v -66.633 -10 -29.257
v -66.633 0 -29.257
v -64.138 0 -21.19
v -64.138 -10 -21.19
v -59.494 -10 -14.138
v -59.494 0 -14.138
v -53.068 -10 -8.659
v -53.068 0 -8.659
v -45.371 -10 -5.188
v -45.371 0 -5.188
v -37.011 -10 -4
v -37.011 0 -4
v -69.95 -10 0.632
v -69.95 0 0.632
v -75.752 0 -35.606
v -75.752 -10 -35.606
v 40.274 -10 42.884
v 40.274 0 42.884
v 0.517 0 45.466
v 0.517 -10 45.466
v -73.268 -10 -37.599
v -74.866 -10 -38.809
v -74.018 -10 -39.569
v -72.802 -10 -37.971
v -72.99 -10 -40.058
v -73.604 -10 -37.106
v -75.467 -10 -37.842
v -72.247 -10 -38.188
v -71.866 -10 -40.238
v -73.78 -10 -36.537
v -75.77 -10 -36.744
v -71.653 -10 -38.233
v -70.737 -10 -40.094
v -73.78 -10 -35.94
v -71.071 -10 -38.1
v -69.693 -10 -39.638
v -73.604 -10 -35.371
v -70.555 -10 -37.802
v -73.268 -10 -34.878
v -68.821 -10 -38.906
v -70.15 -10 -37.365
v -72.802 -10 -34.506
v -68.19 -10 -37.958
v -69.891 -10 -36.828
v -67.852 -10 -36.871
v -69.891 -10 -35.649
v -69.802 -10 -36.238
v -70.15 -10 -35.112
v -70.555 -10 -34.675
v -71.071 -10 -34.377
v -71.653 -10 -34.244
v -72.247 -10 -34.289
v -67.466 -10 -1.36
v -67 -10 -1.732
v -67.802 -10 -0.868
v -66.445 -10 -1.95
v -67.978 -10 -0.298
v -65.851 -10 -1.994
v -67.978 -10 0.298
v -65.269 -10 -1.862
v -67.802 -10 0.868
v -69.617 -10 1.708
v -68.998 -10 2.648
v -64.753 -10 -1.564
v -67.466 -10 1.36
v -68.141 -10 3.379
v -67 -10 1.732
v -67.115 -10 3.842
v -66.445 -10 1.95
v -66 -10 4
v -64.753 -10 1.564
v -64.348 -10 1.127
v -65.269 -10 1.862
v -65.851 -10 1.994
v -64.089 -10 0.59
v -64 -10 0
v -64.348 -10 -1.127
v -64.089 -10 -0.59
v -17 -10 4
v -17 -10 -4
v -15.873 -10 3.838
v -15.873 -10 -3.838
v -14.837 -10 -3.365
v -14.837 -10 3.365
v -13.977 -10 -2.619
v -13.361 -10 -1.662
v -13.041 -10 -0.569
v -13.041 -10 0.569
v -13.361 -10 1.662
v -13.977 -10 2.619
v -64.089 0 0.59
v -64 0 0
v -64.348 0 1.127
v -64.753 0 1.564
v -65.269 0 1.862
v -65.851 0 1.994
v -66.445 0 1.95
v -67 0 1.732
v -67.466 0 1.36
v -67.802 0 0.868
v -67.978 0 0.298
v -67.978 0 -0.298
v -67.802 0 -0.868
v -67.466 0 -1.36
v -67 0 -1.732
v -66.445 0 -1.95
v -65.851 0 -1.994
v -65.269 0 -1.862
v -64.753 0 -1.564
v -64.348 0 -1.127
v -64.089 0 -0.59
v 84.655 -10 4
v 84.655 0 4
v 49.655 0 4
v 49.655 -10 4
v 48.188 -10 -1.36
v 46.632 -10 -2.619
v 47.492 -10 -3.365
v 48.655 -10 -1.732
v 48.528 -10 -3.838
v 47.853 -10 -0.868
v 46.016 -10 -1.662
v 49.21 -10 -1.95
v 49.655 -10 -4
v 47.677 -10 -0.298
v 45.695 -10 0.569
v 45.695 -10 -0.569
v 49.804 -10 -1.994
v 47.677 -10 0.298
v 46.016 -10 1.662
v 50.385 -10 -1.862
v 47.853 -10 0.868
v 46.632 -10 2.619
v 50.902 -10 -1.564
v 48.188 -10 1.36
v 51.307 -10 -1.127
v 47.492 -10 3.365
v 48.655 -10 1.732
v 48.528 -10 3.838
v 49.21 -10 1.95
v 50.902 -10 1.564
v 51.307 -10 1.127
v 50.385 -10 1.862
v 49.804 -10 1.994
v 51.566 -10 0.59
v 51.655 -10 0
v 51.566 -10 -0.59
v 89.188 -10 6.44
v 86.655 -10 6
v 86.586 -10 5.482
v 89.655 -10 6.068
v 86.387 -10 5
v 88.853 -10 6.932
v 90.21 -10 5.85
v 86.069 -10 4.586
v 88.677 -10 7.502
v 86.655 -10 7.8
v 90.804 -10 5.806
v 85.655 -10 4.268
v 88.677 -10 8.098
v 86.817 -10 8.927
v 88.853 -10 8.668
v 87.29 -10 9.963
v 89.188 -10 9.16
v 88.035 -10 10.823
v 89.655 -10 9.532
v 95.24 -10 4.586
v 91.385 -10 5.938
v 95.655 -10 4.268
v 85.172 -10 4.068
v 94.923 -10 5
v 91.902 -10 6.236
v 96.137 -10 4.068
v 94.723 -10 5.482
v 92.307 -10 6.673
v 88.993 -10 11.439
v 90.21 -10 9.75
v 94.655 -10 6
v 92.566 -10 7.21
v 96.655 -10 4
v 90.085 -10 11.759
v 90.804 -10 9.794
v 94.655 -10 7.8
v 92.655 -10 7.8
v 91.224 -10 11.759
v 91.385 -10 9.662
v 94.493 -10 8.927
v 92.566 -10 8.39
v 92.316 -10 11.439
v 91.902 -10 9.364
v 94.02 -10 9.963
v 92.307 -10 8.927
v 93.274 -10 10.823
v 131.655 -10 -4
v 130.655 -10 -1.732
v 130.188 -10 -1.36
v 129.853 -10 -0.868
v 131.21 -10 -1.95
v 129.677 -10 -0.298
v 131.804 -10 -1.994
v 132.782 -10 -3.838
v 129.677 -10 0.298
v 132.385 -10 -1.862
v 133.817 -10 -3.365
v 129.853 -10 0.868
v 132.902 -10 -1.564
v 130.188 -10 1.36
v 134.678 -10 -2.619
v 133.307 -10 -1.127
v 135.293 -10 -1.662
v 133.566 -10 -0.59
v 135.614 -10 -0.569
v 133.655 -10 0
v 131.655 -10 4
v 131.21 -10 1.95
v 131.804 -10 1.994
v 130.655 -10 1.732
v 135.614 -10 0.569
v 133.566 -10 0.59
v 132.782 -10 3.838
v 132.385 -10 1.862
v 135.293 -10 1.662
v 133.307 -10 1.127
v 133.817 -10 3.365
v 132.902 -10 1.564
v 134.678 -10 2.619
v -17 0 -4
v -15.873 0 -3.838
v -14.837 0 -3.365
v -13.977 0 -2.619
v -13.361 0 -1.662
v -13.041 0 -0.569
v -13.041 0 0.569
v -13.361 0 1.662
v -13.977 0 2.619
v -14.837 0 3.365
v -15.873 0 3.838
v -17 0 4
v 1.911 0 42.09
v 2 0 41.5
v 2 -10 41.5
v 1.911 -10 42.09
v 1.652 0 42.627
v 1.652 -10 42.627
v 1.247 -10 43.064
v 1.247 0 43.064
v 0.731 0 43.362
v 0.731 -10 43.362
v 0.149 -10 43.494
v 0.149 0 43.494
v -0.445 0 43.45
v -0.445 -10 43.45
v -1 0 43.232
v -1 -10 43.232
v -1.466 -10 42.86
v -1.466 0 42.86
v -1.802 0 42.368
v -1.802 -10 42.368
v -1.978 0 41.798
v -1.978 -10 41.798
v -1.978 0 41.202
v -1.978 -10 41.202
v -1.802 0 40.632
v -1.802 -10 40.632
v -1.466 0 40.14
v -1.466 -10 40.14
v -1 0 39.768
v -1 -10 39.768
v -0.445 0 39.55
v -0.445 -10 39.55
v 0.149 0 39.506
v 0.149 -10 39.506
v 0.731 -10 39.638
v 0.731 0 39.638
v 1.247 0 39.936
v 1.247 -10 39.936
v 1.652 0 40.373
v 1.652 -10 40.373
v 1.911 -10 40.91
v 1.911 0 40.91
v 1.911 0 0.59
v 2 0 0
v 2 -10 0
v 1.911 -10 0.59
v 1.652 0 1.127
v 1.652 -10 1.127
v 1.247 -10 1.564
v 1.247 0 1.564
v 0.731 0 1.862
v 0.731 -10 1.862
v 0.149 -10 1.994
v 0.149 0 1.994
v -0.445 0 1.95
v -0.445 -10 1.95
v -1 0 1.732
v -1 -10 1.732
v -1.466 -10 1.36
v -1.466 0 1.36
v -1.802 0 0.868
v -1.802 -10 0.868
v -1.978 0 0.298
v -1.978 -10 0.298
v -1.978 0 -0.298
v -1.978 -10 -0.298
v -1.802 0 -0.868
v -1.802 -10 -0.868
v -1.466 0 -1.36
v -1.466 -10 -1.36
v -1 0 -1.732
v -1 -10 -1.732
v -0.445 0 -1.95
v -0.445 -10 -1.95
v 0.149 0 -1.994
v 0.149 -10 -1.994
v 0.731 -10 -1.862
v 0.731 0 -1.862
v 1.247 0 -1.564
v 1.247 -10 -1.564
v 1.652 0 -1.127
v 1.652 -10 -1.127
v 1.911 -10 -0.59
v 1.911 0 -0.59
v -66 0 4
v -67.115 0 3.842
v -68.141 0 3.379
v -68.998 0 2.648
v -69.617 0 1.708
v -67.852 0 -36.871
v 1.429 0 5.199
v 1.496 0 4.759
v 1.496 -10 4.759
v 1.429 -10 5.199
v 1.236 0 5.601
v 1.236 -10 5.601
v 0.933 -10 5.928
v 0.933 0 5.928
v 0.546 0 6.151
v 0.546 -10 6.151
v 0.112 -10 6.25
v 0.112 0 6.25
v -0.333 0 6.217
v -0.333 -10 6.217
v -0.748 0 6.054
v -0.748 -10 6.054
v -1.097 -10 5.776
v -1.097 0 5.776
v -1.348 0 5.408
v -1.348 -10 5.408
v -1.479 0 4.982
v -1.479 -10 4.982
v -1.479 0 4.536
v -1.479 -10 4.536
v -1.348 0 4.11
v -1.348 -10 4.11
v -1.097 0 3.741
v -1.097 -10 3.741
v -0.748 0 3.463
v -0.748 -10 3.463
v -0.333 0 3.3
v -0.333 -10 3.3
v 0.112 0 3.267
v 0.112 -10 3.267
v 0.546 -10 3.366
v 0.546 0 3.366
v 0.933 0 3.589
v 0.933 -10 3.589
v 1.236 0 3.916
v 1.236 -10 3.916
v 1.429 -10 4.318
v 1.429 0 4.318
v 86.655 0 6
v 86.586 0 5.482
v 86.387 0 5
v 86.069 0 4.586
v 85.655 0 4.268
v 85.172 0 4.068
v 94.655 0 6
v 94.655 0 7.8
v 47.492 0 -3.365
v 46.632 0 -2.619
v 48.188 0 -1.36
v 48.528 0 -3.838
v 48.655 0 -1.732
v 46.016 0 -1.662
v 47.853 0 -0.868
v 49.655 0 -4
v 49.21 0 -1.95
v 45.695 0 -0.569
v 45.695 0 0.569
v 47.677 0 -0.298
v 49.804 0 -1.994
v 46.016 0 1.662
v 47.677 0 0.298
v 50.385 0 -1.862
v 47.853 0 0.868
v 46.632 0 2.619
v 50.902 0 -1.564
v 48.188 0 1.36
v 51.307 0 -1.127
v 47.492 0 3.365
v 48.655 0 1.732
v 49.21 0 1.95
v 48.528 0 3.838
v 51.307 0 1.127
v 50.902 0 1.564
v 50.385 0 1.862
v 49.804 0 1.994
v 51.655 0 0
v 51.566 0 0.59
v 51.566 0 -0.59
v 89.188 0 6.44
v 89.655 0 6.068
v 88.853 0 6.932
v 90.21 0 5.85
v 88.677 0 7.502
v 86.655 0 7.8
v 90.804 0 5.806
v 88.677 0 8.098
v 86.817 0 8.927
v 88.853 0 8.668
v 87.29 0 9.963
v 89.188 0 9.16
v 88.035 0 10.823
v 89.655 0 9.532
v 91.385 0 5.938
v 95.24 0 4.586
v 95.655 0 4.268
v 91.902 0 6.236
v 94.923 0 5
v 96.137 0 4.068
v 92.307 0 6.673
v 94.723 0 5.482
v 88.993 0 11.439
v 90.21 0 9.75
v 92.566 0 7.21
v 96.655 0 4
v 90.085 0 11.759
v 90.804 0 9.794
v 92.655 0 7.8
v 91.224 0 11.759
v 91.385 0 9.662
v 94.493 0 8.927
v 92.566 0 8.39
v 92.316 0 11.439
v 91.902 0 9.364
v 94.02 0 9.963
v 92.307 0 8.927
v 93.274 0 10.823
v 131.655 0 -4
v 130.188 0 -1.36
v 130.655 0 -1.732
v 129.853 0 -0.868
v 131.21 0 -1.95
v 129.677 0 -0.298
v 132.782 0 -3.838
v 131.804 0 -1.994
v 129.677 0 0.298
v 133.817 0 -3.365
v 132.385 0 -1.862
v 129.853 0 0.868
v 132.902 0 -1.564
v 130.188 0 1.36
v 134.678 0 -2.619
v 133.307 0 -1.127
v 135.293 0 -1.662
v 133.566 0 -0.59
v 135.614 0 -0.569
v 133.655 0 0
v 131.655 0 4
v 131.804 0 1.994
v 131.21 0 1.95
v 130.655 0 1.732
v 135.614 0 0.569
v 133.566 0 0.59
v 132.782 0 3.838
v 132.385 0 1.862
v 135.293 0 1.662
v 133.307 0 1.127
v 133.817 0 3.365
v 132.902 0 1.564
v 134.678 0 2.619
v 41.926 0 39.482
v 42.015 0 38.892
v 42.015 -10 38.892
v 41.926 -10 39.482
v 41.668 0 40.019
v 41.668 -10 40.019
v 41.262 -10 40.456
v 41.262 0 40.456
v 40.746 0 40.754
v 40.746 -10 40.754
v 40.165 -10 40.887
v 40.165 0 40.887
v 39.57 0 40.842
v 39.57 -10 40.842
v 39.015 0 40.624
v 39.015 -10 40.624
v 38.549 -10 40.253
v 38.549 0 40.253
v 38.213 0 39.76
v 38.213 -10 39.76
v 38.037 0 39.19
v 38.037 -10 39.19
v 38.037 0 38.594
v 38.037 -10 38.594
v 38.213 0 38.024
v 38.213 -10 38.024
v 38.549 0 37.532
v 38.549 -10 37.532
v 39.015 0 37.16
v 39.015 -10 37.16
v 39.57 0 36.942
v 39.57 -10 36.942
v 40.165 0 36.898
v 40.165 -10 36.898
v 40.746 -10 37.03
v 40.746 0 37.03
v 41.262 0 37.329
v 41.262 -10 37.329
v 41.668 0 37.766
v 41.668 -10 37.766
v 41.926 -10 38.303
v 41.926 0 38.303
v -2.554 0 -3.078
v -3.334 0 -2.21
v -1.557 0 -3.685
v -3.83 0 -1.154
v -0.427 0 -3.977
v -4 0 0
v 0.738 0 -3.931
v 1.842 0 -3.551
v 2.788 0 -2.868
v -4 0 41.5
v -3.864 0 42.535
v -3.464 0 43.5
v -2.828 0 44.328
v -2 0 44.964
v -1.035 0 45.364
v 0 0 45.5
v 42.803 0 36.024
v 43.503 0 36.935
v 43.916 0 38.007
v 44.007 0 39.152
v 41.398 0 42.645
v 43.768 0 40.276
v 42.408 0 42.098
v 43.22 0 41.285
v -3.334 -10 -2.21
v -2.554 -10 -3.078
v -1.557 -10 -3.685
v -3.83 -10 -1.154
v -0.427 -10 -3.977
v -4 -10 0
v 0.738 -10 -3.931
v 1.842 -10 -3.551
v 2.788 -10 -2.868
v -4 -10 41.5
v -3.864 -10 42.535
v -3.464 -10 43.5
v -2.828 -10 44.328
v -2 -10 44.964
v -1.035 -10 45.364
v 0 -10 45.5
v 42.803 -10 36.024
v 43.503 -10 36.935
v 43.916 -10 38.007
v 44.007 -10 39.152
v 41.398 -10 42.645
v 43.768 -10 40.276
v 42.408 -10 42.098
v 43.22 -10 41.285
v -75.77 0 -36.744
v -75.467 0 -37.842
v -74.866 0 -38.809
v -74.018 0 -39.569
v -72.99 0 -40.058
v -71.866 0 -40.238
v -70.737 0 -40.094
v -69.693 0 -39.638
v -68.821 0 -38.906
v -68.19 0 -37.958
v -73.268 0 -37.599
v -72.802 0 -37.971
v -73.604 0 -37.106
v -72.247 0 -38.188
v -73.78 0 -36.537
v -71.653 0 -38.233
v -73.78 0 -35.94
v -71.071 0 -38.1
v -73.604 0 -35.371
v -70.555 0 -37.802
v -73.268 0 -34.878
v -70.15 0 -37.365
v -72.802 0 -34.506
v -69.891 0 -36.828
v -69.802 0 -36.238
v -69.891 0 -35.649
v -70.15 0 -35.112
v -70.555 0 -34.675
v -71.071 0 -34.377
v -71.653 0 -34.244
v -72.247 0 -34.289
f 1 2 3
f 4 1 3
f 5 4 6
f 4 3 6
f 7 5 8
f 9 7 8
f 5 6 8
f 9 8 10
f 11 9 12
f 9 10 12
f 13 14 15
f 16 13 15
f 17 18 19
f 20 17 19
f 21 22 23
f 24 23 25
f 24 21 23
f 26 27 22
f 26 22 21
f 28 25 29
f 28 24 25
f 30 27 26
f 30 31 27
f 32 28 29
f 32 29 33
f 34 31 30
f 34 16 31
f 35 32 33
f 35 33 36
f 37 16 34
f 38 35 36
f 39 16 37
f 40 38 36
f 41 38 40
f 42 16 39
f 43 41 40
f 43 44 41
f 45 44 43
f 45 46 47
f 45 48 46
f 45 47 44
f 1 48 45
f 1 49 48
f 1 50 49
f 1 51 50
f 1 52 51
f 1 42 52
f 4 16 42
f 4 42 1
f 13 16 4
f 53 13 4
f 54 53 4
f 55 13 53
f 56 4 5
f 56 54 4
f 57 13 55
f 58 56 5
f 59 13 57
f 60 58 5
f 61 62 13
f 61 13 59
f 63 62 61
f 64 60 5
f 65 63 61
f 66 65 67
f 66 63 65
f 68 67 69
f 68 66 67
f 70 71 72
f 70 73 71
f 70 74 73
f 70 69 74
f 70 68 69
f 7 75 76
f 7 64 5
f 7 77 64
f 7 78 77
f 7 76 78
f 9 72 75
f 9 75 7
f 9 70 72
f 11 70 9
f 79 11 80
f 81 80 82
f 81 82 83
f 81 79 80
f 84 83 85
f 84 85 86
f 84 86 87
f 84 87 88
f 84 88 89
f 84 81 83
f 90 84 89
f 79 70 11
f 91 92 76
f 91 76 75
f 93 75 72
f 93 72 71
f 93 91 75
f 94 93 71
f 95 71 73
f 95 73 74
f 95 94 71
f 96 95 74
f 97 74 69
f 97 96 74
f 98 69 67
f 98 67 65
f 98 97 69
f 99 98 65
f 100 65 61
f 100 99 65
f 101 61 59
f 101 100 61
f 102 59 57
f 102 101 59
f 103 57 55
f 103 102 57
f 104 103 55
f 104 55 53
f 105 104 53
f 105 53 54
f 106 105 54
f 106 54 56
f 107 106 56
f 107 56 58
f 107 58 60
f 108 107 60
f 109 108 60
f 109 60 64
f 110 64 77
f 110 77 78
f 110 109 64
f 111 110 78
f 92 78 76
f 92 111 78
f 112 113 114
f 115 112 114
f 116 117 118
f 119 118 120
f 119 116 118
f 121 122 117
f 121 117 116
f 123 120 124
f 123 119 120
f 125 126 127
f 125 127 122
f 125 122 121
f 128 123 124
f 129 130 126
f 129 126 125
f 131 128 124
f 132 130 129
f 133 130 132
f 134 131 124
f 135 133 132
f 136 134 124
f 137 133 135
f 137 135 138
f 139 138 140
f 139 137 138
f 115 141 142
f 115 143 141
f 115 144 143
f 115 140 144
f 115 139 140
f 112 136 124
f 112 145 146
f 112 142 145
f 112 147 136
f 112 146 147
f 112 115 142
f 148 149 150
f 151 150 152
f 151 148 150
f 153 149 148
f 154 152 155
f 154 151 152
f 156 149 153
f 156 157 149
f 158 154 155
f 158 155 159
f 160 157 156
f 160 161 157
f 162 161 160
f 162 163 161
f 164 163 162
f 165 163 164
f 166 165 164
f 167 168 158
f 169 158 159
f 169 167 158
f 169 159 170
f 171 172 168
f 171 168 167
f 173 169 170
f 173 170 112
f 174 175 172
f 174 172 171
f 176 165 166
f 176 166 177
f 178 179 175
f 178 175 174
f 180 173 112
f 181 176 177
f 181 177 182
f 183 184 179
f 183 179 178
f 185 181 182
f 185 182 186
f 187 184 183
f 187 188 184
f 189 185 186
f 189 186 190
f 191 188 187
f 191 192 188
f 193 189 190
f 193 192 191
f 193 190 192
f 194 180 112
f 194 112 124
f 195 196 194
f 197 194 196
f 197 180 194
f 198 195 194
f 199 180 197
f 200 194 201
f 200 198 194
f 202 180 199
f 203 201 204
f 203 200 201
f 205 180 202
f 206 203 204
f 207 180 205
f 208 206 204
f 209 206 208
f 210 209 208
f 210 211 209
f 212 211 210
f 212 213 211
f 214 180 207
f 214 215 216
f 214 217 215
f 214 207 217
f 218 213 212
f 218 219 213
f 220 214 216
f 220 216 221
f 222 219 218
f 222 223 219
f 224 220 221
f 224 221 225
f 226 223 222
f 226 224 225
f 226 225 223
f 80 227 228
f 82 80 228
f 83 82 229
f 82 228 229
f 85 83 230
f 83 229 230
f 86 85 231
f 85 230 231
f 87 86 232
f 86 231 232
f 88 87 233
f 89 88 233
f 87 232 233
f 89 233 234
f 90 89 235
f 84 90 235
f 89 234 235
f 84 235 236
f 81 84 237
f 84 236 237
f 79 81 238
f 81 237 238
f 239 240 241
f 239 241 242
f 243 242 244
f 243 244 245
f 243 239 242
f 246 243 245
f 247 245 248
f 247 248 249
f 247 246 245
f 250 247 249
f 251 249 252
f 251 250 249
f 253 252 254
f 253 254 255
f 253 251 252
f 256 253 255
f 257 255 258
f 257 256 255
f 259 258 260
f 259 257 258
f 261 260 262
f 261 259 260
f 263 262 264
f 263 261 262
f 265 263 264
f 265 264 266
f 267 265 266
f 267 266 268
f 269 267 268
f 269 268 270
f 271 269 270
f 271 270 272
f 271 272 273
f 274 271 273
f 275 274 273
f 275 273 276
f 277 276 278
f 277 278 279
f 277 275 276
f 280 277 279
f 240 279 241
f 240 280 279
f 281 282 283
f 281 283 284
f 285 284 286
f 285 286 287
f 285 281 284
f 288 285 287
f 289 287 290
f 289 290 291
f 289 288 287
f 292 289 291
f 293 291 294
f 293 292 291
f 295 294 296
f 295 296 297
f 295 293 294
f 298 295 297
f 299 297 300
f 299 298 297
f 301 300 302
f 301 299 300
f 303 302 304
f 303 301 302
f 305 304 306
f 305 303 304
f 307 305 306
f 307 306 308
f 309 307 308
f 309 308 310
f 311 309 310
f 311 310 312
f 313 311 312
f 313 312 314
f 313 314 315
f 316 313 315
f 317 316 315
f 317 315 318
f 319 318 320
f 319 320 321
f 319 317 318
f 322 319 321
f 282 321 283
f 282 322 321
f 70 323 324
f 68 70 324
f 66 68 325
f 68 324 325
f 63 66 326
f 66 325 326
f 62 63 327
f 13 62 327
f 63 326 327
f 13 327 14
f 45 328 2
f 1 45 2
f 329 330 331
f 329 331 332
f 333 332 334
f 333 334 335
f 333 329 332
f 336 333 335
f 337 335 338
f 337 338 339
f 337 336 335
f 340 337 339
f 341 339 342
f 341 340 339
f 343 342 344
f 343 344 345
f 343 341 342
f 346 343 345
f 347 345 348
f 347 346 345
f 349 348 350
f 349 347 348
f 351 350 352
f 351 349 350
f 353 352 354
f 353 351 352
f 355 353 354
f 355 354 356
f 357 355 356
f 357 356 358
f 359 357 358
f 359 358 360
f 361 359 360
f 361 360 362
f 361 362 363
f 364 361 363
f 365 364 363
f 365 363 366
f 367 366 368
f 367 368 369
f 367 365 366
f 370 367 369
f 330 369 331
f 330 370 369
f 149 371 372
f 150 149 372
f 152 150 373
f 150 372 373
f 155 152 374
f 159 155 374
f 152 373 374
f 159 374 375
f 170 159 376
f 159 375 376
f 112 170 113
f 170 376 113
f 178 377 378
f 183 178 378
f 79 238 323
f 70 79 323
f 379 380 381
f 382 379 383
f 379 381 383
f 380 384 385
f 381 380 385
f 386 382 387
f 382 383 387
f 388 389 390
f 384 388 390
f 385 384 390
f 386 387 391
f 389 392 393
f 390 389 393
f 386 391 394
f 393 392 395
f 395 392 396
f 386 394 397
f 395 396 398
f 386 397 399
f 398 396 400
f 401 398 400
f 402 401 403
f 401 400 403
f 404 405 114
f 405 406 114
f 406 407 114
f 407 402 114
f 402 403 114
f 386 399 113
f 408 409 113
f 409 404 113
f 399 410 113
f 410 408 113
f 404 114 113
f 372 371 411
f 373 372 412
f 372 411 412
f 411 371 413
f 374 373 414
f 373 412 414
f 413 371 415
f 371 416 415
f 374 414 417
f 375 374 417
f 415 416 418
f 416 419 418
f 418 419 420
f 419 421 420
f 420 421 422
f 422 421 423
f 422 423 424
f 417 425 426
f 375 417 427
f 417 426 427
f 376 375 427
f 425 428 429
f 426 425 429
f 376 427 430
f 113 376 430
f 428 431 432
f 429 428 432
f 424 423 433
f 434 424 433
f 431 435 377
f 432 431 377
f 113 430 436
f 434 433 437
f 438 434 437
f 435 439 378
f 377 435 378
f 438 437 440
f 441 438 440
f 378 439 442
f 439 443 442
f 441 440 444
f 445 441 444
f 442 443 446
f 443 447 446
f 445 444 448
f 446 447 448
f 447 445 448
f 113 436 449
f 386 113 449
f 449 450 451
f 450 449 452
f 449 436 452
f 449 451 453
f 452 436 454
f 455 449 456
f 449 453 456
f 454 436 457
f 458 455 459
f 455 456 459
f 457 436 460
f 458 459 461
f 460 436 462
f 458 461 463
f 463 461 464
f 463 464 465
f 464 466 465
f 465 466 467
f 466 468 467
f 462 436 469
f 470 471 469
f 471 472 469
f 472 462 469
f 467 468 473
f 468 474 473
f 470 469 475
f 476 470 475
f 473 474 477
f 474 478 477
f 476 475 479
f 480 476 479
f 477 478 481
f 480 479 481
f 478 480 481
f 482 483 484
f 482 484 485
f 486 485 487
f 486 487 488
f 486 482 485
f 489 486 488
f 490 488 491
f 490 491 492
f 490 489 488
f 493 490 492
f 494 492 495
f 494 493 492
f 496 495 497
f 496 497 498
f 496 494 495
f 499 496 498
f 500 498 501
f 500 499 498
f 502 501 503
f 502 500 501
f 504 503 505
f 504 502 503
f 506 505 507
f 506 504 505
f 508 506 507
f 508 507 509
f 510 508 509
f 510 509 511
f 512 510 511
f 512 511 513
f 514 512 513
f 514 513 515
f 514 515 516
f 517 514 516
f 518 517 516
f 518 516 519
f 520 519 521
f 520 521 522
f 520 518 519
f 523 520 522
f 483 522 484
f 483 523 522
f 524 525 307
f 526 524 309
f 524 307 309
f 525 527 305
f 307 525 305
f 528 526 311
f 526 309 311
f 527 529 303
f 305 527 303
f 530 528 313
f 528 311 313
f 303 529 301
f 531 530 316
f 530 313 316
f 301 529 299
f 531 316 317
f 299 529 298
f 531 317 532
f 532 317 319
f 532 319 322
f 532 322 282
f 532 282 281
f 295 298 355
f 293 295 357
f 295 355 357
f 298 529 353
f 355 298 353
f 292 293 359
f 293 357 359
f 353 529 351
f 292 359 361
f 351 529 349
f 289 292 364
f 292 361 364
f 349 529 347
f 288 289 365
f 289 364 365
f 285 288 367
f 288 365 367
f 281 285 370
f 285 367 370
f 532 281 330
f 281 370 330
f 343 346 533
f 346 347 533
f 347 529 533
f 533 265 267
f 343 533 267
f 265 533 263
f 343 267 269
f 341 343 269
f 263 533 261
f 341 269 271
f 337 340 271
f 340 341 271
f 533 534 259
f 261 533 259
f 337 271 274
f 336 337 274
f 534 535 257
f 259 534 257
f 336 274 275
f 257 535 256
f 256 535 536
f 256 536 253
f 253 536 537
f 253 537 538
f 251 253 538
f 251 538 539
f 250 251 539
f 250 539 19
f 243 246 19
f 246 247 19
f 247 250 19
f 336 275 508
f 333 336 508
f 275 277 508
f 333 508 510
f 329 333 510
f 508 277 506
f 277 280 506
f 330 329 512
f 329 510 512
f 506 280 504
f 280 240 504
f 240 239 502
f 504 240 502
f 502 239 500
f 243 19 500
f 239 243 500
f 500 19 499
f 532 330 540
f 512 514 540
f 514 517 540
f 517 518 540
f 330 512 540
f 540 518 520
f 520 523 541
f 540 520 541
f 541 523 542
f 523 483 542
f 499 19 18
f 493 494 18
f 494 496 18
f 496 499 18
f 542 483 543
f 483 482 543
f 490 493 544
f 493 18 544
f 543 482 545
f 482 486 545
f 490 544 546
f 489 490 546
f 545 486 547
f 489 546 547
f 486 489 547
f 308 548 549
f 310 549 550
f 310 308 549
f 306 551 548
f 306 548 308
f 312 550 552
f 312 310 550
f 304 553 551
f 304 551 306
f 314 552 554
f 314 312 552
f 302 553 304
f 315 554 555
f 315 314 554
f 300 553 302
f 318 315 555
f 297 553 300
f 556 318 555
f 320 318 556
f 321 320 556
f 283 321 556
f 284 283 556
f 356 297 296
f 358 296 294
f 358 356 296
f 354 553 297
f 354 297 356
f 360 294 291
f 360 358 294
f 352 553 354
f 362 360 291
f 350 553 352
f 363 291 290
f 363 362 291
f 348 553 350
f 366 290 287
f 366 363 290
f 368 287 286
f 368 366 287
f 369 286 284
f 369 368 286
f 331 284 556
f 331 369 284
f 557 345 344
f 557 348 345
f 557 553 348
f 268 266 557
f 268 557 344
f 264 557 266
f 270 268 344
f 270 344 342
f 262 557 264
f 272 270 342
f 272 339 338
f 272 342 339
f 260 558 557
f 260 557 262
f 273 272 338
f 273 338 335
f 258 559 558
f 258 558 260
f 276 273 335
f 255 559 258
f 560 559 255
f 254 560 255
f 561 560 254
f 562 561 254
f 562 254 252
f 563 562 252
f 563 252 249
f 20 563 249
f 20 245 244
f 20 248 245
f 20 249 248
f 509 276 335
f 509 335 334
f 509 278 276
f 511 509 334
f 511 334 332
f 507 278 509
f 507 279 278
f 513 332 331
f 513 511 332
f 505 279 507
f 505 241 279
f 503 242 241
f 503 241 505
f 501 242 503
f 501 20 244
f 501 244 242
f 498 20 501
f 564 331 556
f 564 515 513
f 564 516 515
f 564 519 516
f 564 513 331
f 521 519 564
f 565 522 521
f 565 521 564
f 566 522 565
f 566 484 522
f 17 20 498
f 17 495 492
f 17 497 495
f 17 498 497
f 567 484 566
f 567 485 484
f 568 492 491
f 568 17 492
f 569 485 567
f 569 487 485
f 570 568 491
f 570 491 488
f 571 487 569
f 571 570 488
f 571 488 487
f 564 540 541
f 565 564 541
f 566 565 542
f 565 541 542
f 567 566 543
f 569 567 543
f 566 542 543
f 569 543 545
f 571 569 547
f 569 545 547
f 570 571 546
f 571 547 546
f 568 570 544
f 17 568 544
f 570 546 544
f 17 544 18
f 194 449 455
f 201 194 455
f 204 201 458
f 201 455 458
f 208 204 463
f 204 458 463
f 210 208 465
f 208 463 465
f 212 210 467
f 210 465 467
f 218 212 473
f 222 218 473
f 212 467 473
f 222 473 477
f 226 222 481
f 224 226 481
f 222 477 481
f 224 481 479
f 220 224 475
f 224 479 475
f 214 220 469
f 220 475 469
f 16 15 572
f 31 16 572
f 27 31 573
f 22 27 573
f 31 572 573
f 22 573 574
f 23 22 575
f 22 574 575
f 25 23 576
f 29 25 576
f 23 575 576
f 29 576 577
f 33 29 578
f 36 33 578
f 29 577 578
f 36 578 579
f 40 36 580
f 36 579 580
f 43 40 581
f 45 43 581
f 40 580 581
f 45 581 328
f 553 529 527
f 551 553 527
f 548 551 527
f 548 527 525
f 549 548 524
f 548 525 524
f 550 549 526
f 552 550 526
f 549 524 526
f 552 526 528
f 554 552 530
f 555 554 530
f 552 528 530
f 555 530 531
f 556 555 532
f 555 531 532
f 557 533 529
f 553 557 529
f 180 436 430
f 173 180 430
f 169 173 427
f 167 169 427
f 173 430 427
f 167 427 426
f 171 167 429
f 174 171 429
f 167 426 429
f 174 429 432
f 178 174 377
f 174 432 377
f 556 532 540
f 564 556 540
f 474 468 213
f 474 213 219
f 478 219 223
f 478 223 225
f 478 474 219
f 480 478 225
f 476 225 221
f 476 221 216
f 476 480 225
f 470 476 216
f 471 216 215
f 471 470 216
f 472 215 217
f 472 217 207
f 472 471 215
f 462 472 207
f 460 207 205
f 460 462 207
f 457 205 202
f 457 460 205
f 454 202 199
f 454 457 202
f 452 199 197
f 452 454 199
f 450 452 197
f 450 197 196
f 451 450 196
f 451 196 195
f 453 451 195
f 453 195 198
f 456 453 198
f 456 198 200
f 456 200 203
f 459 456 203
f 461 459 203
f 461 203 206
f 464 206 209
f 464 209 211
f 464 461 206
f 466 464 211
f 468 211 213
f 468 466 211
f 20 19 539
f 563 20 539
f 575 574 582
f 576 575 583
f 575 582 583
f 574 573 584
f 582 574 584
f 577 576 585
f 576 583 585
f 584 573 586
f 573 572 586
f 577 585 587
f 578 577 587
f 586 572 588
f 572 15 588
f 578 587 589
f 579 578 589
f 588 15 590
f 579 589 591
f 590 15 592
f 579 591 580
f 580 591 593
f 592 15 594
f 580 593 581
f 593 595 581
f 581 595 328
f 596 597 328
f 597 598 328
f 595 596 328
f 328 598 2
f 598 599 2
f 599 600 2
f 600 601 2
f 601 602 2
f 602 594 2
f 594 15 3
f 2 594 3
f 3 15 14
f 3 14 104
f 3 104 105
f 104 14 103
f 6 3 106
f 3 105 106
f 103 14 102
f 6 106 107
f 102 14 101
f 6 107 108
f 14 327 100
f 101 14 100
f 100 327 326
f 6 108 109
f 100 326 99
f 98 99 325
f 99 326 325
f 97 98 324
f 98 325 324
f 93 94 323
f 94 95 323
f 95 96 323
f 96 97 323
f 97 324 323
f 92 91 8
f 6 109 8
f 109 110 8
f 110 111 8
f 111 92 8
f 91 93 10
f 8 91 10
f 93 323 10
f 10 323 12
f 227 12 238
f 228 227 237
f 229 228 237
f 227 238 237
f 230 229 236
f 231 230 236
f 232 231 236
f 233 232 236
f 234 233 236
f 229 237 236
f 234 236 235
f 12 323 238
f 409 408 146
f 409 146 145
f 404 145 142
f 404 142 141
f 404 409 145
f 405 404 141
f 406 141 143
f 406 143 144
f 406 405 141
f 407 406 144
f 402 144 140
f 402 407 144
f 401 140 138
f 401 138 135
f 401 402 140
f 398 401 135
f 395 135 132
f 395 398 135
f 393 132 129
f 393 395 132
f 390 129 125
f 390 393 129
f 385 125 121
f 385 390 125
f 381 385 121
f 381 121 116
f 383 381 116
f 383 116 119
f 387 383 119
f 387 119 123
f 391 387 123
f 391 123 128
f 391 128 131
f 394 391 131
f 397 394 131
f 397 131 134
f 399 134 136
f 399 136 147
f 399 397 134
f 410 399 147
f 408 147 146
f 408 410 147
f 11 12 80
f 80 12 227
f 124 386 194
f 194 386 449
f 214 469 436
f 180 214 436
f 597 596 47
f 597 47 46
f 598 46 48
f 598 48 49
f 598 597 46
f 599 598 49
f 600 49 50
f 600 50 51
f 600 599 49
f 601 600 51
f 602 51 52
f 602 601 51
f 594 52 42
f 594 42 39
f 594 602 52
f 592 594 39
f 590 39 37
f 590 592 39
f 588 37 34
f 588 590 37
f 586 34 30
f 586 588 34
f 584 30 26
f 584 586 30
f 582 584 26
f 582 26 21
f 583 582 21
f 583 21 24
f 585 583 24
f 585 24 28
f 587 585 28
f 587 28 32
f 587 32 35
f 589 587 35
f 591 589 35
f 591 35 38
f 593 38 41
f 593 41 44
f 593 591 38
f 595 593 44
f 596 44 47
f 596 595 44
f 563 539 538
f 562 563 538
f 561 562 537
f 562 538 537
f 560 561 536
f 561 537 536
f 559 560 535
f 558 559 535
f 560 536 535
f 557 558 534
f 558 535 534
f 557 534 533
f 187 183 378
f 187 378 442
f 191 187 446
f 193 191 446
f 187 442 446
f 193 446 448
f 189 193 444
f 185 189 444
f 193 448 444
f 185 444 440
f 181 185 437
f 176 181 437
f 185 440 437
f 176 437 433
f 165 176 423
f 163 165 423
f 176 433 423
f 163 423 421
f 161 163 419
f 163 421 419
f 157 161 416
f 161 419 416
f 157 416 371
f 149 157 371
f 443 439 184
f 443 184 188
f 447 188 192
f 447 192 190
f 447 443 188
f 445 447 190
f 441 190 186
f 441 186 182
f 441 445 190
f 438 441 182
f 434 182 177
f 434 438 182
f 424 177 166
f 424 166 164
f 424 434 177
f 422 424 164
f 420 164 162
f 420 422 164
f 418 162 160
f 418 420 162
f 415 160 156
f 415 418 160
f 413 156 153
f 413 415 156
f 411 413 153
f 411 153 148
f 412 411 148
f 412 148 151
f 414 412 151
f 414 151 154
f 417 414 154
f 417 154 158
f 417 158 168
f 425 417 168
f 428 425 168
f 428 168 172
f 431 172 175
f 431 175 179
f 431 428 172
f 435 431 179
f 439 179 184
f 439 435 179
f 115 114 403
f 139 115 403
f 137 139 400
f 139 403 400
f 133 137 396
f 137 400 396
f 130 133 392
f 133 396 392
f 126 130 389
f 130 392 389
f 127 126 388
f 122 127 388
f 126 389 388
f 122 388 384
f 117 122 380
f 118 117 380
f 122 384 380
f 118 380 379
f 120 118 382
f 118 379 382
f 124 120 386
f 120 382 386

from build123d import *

# Parameters (mm, degrees)
F0_R     = 2
F0_R_2   = 1.495804
F1_DEPTH = 10
F2_R     = 2
F4_DEPTH = 10
F3_R     = 2
F5_DEPTH = 10


with BuildPart() as f1:
    # F0 (on Front) → F1 (new body)
    with BuildSketch(Plane.XZ):
        with BuildLine():
            Line((40.274405, 42.883806), (0.51749, 45.466384))
            Line((0.51749, 45.466384), (0, 45.5))
            ThreePointArc((0, 45.5), (-2.828427, 44.328427), (-4, 41.5))
            Line((-4, 41.5), (-4, 0))
            ThreePointArc((-4, 0), (-1.556988, -3.684534), (2.787895, -2.868387))
            Line((2.787895, -2.868387), (42.80301, 36.023832))
            ThreePointArc((42.80301, 36.023832), (43.768267, 40.275641), (40.274405, 42.883806))
        make_face()
        Circle(F0_R, mode=Mode.SUBTRACT)
        with Locations((0, 4.75859)):
            Circle(F0_R_2, mode=Mode.SUBTRACT)
        with Locations((0, 41.5)):
            Circle(F0_R, mode=Mode.SUBTRACT)
        with Locations((40.015115, 38.892219)):
            Circle(F0_R, mode=Mode.SUBTRACT)
    extrude(amount=F1_DEPTH)


with BuildPart() as f4:
    # F2 (on Front) → F4 (new body)
    with BuildSketch(Plane.XZ):
        with BuildLine():
            Line((-37.01062, -4), (-17, -4))
            ThreePointArc((-17, -4), (-13, 0), (-17, 4))
            Line((-17, 4), (-66, 4))
            ThreePointArc((-66, 4), (-68.595236, 3.043805), (-69.949696, 0.632375))
            Line((-69.949696, 0.632375), (-75.751737, -35.60609))
            ThreePointArc((-75.751737, -35.60609), (-72.434416, -40.188161), (-67.852344, -36.87084))
            Line((-67.852344, -36.87084), (-66.633343, -29.257187))
            ThreePointArc((-66.633343, -29.257187), (-56.47489, -11.171461), (-37.01062, -4))
        make_face()
        with Locations((-71.802041, -36.238465)):
            Circle(F2_R, mode=Mode.SUBTRACT)
        with Locations((-66, 0)):
            Circle(F2_R, mode=Mode.SUBTRACT)
    extrude(amount=F4_DEPTH)


with BuildPart() as f5:
    # F3 (on Front) → F5 (new body)
    with BuildSketch(Plane.XZ):
        with BuildLine():
            Line((84.654577, 4), (49.654577, 4))
            ThreePointArc((49.654577, 4), (45.654577, 0), (49.654577, -4))
            Line((49.654577, -4), (87.654577, -4))
            Line((87.654577, -4), (93.654577, -4))
            Line((93.654577, -4), (131.654577, -4))
            ThreePointArc((131.654577, -4), (135.654577, 0), (131.654577, 4))
            Line((131.654577, 4), (96.654577, 4))
            ThreePointArc((96.654577, 4), (95.240363, 4.585786), (94.654577, 6))
            Line((94.654577, 6), (94.654577, 7.8))
            ThreePointArc((94.654577, 7.8), (90.654577, 11.8), (86.654577, 7.8))
            Line((86.654577, 7.8), (86.654577, 6))
            ThreePointArc((86.654577, 6), (86.06879, 4.585786), (84.654577, 4))
        make_face()
        with Locations((49.654577, 0)):
            Circle(F3_R, mode=Mode.SUBTRACT)
        with Locations((131.654577, 0)):
            Circle(F3_R, mode=Mode.SUBTRACT)
        with Locations((90.654577, 7.8)):
            Circle(F3_R, mode=Mode.SUBTRACT)
    extrude(amount=F5_DEPTH)


solid = Compound([f1.part, f4.part, f5.part])
